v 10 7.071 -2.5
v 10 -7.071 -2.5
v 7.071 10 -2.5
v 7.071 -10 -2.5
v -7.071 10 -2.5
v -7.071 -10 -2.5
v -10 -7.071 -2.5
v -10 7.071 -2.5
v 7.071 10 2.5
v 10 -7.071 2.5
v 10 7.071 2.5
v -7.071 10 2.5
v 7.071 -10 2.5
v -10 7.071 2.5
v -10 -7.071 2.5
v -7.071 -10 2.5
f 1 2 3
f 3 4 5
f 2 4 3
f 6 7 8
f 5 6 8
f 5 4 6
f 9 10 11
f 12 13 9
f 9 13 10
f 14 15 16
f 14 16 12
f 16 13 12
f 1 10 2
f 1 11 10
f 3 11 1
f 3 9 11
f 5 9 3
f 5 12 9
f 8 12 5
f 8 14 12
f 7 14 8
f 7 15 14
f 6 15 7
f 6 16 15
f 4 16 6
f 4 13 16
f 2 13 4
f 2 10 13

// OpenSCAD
$fn = 64;

/*module offset_square(length, width, off){
    offset(delta = off)
        square([length, width], center = true);
    
}

linear_extrude(5, center = true)
    offset_square(20,20,10);*/

module chamfer_square(length, width, chamfer){
    offset(delta = chamfer, chamfer = true)
        square([length-2*chamfer,width-2*chamfer], center = true);
    // take 2*chamfer out because the offset works by adding a periferical skin with the chamfer in each side
}

linear_extrude(height = 5,center = true)
    chamfer_square(20,20,5);
